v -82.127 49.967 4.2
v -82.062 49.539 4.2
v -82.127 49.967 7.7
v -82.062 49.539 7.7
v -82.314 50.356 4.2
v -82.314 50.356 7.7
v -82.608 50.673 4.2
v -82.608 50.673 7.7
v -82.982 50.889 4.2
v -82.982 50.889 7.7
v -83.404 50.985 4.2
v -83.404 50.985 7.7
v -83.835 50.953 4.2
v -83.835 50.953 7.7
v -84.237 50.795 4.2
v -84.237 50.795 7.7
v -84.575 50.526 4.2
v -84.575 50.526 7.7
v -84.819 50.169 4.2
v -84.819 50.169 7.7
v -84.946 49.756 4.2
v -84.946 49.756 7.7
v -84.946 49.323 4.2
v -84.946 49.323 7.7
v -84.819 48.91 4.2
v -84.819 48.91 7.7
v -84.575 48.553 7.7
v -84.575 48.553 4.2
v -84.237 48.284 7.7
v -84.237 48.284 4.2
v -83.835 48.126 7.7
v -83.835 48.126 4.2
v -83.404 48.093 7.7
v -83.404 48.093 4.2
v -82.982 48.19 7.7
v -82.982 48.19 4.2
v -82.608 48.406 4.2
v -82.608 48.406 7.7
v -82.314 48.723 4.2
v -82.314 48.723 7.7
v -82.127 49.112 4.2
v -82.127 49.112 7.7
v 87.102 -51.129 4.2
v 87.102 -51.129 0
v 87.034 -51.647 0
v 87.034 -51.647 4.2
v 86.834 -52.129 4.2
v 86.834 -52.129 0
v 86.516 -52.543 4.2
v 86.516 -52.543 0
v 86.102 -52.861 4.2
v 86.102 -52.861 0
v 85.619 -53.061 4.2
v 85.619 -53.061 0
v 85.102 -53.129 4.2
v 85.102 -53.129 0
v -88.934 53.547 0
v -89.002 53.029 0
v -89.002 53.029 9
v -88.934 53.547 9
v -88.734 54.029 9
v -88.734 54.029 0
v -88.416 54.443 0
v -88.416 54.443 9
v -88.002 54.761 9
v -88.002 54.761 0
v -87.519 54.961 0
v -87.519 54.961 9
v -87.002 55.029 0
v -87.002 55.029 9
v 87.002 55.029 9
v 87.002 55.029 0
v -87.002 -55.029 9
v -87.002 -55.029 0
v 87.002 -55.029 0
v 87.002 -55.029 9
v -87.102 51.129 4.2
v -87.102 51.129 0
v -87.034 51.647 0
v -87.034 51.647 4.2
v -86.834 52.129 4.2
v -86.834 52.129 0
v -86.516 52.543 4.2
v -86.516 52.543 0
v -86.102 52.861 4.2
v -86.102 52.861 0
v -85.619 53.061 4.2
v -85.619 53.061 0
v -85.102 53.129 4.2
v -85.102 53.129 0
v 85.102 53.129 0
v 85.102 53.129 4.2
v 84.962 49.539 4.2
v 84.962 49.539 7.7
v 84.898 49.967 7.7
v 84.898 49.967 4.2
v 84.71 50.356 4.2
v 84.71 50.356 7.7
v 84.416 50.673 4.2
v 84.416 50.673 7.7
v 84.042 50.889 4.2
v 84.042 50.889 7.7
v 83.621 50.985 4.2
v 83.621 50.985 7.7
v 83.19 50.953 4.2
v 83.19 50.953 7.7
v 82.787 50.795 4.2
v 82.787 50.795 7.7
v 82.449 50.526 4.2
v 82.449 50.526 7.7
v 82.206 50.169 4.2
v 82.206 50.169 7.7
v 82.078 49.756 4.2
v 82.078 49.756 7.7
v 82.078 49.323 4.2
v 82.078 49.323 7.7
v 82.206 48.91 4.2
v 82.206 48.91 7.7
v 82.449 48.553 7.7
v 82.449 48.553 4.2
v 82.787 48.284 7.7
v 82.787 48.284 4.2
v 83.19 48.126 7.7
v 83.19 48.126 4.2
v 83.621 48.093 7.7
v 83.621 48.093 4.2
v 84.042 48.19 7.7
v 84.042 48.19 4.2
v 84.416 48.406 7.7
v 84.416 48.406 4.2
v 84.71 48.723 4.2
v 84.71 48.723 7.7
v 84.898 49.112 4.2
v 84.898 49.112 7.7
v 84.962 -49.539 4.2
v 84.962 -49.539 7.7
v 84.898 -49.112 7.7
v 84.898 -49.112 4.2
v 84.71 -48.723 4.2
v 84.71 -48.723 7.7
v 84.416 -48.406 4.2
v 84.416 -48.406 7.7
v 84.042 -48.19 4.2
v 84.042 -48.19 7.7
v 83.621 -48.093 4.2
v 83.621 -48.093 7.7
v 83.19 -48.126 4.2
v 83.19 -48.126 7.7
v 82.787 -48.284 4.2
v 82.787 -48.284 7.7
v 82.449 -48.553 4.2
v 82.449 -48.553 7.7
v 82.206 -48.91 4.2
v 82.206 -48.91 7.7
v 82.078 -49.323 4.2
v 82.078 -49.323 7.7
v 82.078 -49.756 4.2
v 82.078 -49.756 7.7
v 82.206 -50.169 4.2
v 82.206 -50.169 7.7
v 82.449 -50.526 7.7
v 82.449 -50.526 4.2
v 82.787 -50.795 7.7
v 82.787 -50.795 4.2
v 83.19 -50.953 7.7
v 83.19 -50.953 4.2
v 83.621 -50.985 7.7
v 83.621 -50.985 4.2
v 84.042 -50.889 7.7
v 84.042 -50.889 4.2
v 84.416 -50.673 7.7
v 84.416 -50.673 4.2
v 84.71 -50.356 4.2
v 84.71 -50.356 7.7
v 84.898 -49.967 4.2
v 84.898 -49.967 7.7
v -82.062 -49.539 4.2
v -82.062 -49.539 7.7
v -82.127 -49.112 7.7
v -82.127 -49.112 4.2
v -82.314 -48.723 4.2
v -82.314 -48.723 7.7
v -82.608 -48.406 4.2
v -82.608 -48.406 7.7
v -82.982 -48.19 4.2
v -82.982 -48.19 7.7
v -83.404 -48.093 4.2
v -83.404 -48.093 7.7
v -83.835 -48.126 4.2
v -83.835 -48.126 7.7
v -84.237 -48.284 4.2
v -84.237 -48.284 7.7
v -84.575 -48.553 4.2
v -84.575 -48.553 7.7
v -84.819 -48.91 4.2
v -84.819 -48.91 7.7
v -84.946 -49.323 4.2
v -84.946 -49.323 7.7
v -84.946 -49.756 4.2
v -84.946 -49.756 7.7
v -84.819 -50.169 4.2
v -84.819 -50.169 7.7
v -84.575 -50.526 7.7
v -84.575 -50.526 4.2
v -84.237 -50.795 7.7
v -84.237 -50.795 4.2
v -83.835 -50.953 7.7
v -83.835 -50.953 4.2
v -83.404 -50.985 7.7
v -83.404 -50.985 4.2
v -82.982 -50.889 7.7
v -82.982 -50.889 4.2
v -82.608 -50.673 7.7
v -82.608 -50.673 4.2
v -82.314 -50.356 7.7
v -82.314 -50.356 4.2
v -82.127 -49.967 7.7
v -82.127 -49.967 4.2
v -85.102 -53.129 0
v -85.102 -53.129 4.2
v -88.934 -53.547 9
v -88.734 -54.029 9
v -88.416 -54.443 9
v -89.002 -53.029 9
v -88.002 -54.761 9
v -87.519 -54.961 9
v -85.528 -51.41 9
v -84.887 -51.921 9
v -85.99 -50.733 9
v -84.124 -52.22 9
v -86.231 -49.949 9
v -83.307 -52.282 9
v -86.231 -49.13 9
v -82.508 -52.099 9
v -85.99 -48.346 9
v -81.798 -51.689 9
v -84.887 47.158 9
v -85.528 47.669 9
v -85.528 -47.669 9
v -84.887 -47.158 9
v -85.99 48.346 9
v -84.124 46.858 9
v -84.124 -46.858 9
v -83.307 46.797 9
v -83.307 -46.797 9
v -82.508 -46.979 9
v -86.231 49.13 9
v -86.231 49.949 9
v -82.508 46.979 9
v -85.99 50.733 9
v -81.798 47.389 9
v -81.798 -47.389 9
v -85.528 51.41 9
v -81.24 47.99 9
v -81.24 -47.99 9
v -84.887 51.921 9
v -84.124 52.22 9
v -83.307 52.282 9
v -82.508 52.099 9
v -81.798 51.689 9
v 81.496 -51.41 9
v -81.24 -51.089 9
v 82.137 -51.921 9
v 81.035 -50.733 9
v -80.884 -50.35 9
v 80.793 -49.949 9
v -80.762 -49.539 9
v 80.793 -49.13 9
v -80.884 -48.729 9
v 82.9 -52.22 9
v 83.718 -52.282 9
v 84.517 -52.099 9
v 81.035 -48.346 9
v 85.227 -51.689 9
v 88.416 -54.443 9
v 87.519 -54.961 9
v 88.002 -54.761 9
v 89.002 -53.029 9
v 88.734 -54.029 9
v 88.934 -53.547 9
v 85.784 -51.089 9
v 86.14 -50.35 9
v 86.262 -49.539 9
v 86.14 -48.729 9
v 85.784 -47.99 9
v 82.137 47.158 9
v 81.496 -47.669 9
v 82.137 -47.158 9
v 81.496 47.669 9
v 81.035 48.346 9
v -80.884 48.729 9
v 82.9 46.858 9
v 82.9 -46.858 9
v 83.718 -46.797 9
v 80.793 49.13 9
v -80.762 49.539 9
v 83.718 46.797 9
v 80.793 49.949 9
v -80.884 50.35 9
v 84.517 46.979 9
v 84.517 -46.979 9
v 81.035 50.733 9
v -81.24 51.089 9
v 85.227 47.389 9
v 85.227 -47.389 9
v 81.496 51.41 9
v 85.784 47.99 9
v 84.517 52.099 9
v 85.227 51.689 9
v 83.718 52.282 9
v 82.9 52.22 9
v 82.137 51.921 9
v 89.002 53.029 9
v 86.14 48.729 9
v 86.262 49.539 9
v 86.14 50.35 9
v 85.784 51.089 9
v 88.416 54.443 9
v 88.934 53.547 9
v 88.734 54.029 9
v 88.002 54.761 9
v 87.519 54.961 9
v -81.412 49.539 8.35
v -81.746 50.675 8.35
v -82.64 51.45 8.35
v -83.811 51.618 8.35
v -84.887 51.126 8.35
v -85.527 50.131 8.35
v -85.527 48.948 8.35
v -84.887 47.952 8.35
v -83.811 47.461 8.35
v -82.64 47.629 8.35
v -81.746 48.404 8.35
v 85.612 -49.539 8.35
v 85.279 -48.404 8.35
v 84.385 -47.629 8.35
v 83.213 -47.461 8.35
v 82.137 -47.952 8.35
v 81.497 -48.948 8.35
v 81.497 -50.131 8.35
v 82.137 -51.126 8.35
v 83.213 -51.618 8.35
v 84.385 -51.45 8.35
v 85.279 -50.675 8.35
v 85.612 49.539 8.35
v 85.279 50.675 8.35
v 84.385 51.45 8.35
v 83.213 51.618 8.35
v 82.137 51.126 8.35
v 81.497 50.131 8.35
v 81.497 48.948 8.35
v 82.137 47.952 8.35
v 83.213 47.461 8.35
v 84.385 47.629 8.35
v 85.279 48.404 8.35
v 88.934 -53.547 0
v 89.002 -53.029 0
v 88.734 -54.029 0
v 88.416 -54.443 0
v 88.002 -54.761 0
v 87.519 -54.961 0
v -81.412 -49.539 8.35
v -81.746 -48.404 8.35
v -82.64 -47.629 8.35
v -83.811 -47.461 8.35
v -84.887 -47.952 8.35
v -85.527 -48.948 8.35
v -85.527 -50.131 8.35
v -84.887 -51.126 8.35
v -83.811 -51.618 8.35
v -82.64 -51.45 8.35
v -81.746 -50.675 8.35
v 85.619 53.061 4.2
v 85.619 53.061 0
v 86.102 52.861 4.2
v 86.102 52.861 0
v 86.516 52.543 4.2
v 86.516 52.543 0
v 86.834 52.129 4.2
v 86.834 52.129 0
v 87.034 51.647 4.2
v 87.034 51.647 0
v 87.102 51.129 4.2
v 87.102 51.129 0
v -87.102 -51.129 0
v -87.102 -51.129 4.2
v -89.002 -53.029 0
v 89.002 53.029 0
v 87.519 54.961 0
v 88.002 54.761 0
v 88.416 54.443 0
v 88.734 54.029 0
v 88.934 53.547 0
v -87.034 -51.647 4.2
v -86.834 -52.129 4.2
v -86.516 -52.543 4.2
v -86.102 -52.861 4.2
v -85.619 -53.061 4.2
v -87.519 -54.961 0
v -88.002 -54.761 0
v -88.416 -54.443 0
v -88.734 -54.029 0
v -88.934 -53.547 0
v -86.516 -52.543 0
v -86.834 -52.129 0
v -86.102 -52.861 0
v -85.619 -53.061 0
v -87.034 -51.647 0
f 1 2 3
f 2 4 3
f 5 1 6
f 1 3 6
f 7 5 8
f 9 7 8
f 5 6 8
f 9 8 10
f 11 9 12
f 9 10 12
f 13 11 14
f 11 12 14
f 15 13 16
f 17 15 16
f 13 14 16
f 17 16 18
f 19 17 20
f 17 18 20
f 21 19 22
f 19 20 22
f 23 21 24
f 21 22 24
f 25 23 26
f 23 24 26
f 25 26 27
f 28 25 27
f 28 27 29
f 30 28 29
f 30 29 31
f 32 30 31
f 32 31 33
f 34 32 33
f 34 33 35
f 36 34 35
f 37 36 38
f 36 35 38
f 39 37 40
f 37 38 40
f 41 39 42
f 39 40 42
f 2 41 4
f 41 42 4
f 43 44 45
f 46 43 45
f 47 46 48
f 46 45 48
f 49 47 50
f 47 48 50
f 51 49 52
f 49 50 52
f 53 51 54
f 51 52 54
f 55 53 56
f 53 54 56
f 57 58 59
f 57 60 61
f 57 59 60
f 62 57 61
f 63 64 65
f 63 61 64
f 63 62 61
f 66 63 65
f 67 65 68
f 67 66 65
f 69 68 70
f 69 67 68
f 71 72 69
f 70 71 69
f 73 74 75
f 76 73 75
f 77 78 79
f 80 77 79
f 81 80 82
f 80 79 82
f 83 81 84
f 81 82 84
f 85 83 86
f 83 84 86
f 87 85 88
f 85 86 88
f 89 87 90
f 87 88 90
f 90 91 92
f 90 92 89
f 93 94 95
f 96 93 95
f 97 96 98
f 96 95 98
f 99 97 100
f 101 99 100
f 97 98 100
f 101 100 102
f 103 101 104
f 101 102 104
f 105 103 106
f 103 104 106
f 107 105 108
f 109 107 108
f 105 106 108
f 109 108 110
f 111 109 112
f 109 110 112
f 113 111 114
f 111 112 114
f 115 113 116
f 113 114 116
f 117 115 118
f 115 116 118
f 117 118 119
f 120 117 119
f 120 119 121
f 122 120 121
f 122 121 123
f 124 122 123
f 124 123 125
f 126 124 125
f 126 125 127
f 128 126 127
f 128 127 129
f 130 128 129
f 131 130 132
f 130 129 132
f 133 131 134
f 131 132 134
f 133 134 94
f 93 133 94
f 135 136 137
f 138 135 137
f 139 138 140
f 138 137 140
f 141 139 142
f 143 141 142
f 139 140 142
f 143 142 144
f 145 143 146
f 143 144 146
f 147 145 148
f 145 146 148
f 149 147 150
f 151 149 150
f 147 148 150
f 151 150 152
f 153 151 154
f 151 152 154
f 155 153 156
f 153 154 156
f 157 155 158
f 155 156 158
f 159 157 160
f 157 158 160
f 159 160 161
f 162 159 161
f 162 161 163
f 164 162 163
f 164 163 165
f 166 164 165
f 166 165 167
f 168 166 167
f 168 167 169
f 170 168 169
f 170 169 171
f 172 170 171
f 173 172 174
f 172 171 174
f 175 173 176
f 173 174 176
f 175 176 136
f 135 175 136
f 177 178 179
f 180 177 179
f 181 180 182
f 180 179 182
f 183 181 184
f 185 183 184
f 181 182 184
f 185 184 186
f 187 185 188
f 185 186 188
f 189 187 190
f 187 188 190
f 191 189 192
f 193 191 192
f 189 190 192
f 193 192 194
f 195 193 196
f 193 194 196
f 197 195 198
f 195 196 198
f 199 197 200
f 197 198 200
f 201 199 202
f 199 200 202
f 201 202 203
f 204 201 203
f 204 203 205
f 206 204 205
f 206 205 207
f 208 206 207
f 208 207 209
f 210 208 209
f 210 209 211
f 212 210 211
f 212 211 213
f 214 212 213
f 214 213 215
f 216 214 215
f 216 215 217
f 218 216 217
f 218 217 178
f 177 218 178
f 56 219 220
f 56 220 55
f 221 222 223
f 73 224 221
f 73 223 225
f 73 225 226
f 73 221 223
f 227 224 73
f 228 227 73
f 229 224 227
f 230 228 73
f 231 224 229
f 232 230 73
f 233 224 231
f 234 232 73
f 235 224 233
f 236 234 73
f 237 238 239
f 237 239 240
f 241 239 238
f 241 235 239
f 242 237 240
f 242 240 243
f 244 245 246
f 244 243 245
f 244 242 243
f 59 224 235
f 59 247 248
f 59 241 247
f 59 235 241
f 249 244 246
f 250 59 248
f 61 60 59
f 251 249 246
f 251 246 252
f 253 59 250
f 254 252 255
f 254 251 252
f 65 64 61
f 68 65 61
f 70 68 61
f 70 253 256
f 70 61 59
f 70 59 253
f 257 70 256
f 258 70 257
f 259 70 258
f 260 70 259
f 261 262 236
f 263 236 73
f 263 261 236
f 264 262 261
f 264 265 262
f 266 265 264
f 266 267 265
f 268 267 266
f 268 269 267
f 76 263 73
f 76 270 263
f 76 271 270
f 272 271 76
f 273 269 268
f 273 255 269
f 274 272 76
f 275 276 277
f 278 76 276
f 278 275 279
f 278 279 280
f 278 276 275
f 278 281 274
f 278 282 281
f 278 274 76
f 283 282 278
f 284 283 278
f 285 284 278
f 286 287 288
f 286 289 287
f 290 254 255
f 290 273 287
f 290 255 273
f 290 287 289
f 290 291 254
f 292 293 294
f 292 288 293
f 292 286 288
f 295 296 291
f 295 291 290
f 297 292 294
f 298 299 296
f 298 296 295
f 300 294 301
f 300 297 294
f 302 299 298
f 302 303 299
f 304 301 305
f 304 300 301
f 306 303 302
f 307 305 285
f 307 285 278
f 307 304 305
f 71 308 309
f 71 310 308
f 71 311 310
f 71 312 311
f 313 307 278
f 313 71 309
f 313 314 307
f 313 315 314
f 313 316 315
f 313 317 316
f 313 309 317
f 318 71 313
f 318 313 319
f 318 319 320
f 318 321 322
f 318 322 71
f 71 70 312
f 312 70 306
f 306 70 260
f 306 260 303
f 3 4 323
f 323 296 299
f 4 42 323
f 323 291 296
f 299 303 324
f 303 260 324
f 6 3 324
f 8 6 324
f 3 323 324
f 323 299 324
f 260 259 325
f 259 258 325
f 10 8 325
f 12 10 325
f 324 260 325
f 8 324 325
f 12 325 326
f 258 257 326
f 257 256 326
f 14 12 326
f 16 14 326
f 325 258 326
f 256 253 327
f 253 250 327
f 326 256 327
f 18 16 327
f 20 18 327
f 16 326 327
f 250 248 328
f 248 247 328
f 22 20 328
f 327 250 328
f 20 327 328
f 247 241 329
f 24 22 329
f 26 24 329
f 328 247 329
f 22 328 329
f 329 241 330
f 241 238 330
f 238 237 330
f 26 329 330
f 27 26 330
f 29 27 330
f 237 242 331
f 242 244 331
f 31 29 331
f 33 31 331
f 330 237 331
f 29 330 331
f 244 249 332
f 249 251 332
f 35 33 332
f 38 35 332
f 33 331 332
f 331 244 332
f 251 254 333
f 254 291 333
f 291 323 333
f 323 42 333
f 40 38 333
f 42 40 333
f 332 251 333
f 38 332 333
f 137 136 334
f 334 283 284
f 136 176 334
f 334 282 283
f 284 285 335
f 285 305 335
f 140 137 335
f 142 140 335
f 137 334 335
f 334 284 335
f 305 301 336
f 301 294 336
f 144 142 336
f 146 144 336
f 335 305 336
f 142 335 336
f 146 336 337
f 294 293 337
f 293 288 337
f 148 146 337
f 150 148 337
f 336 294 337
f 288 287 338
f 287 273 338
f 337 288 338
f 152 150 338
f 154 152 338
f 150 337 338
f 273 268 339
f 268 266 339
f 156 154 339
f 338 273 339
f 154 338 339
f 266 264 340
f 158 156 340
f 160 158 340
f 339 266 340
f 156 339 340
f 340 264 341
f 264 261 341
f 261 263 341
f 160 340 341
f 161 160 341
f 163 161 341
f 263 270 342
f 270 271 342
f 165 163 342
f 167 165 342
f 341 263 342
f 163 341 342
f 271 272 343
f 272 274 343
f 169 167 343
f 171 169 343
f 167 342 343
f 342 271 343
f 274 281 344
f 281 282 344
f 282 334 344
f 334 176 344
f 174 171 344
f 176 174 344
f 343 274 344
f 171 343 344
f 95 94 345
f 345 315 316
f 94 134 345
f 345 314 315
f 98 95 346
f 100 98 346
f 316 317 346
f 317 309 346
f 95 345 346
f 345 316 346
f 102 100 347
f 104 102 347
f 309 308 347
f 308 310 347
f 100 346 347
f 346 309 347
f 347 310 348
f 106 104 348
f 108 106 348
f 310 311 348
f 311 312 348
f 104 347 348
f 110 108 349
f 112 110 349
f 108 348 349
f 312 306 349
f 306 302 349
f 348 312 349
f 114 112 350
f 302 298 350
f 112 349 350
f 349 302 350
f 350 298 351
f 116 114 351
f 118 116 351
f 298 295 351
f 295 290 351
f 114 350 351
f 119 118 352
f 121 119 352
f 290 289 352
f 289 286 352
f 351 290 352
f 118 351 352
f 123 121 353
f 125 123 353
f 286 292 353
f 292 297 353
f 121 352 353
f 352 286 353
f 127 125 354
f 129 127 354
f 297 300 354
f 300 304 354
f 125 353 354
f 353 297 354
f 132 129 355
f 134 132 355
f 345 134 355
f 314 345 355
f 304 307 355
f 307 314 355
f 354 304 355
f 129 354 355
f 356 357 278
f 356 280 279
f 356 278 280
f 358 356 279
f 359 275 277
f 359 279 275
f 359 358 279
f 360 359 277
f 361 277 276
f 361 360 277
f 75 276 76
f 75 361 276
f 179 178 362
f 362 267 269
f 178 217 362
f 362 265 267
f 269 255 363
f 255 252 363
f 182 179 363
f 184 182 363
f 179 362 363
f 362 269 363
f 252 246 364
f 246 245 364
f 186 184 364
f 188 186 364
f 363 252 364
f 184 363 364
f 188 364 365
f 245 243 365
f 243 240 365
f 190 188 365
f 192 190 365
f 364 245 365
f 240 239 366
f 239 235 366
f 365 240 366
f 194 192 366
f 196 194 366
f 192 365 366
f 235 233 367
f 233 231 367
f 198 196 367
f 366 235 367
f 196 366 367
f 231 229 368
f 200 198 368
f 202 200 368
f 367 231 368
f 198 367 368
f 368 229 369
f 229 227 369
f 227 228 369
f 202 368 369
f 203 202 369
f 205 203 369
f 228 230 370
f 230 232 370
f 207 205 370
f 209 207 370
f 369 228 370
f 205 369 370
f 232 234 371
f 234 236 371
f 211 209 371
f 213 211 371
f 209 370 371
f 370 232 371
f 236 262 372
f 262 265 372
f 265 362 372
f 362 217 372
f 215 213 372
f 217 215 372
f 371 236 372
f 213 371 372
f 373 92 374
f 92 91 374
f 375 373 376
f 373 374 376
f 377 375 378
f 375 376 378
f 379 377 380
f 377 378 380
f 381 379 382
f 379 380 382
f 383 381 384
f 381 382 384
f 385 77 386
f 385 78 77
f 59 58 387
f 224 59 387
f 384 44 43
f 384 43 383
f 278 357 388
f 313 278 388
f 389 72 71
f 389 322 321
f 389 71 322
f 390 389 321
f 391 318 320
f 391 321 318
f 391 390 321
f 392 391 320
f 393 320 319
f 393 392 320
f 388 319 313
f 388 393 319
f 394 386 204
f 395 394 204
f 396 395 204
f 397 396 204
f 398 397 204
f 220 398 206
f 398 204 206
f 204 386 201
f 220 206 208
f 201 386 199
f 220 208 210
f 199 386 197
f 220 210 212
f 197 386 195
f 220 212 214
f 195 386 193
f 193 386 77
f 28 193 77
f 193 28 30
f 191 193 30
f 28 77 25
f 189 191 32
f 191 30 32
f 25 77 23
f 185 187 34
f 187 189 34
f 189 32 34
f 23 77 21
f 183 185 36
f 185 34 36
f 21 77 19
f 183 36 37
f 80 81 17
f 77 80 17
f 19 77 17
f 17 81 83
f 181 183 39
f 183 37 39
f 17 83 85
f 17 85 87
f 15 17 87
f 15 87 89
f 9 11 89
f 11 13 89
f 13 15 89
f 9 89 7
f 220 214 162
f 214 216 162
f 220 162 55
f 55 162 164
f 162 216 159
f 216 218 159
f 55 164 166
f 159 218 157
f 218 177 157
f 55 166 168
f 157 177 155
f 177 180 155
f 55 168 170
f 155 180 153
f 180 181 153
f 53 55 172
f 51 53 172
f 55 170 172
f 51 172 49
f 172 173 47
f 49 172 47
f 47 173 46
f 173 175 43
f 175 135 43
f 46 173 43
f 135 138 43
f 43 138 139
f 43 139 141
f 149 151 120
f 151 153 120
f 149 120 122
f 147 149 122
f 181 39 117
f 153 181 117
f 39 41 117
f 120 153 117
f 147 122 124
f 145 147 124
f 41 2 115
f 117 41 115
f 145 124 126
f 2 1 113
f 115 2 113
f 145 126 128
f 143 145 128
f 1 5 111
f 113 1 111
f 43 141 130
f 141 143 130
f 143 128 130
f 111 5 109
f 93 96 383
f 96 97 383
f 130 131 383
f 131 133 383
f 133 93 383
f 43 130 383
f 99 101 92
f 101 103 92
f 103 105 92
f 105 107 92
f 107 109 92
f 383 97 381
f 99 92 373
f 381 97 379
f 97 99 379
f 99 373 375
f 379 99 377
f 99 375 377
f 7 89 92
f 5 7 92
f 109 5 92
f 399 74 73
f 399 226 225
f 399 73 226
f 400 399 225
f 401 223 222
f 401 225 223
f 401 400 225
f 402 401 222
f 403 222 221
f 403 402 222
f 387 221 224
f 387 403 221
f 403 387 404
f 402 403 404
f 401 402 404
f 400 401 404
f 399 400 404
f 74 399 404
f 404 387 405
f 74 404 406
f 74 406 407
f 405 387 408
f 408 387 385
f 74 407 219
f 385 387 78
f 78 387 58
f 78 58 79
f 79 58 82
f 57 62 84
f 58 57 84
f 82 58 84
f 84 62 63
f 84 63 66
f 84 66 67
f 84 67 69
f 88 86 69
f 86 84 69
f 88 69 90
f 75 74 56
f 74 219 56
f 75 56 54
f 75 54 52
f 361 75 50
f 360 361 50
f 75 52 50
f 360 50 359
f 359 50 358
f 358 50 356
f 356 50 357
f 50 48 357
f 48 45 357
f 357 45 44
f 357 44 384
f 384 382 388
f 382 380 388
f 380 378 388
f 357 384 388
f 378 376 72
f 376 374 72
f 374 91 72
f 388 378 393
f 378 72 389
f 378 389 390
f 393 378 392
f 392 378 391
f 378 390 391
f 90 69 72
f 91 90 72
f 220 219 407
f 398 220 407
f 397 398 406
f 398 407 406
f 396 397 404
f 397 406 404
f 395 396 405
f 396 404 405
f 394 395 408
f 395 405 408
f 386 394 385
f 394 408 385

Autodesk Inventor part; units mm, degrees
ref_plane "YZ Plane" through (0, 0, 0) normal (1, 0, 0) x (0, 1, 0)
ref_plane "XZ Plane" through (0, 0, 0) normal (0, 1, 0) x (-1, 0, 0)
ref_plane "XY Plane" through (0, 0, 0) normal (0, 0, 1) x (1, 0, 0)
sketch "Sketch3" plane through (0, 0, 0) normal (0, 0, 1) x (1, 0, 0)
  line L0 (-8.9702, 53.029) -> (-8.9702, 53.0291) projected
  line L1 (-8.9702, 53.0291) -> (-4.9702, 53.0291) projected
  line L2 (-4.9702, 53.0291) -> (-4.9702, 55.029) projected
  line L3 (-4.9702, 55.029) -> (-87.0018, 55.029) projected
  arc A0 (-87.0018, 55.029) -> (-89.0018, 53.029) centre (-87.0018, 53.029) ccw projected
  line L4 (-89.0018, 53.029) -> (-89.0018, -53.029) projected
  arc A1 (-89.0018, -53.029) -> (-87.0018, -55.029) centre (-87.0018, -53.029) ccw projected
  line L5 (-87.0018, -55.029) -> (-4.9702, -55.029) projected
  line L6 (-4.9702, -55.029) -> (-4.9702, -53.029) projected
  line L7 (-4.9702, -53.029) -> (-8.9702, -53.029) projected
  line L8 (-8.9702, -53.029) -> (-85.0018, -53.029) projected
  arc A2 (-87.0018, -51.029) -> (-85.0018, -53.029) centre (-85.0018, -51.029) ccw projected
  line L9 (-87.0018, -51.029) -> (-87.0018, 51.029) projected
  arc A3 (-85.0018, 53.029) -> (-87.0018, 51.029) centre (-85.0018, 51.029) ccw projected
  line L10 (-85.0018, 53.029) -> (-8.9702, 53.029) projected
  line L11 (49.0298, 53.0291) -> (49.0298, 53.029) projected
  line L12 (49.0298, 53.029) -> (85.0018, 53.029) projected
  arc A4 (87.0018, 51.029) -> (85.0018, 53.029) centre (85.0018, 51.029) ccw projected
  line L13 (87.0018, 51.029) -> (87.0018, -51.029) projected
  arc A5 (85.0018, -53.029) -> (87.0018, -51.029) centre (85.0018, -51.029) ccw projected
  line L14 (85.0018, -53.029) -> (49.0298, -53.029) projected
  line L15 (49.0298, -53.029) -> (45.0298, -53.029) projected
  line L16 (45.0298, -53.029) -> (45.0298, -55.029) projected
  line L17 (45.0298, -55.029) -> (87.0018, -55.029) projected
  arc A6 (87.0018, -55.029) -> (89.0018, -53.029) centre (87.0018, -53.029) ccw projected
  line L18 (89.0018, -53.029) -> (89.0018, 53.029) projected
  arc A7 (89.0018, 53.029) -> (87.0018, 55.029) centre (87.0018, 53.029) ccw projected
  line L19 (87.0018, 55.029) -> (45.0298, 55.029) projected
  line L20 (45.0298, 55.029) -> (45.0298, 53.0291) projected
  line L21 (45.0298, 53.0291) -> (49.0298, 53.0291) projected
  line L22 (87.0018, 55.029) -> (-87.0018, 55.029)
  line L23 (-89.0018, 53.029) -> (-89.0018, -53.029)
  line L24 (-87.0018, -55.029) -> (87.0018, -55.029)
  line L25 (89.0018, -53.029) -> (89.0018, 53.029)
  line L26 (85.1018, 53.129) -> (-85.1018, 53.129)
  line L27 (-87.1018, 51.129) -> (-87.1018, -51.129)
  line L28 (-85.1018, -53.129) -> (85.1018, -53.129)
  line L29 (87.1018, -51.129) -> (87.1018, 51.129)
  arc A8 (89.0018, 53.029) -> (87.0018, 55.029) centre (87.0018, 53.029) ccw
  arc A9 (87.1018, 51.129) -> (85.1018, 53.129) centre (85.1018, 51.129) ccw
  arc A10 (85.1018, -53.129) -> (87.1018, -51.129) centre (85.1018, -51.129) ccw
  arc A11 (87.0018, -55.029) -> (89.0018, -53.029) centre (87.0018, -53.029) ccw
  arc A12 (-87.1018, -51.129) -> (-85.1018, -53.129) centre (-85.1018, -51.129) ccw
  arc A13 (-89.0018, -53.029) -> (-87.0018, -55.029) centre (-87.0018, -53.029) ccw
  arc A14 (-85.1018, 53.129) -> (-87.1018, 51.129) centre (-85.1018, 51.129) ccw
  arc A15 (-87.0018, 55.029) -> (-89.0018, 53.029) centre (-87.0018, 53.029) ccw
  point P0 (0, 0)
  dimension "d0" = 0.1
  dimension "d1" = 0.1
  dimension "d2" = 0.1
  dimension "d3" = 0.1
  dimension "d4" = 2
extrude "Extrusion1" add sketch "Sketch3" along normal blind 4.2 contours L26 A14 L27 A12 L28 L6 L5 A1 L4 A0 L3 L2 | L2 L22 L20 L26 | L20 L19 A7 L18 A6 L17 L16 L28 A10 L29 A9 L26 | L28 L16 L24 L6
sketch "Sketch4" plane through (0, 0, 4.2) normal (0, 0, 1) x (1, 0, 0)
  line L0 (-87.0018, -55.029) -> (87.0018, -55.029) projected
  arc A0 (87.0018, -55.029) -> (89.0018, -53.029) centre (87.0018, -53.029) ccw projected
  line L1 (89.0018, -53.029) -> (89.0018, 53.029) projected
  arc A1 (89.0018, 53.029) -> (87.0018, 55.029) centre (87.0018, 53.029) ccw projected
  line L2 (87.0018, 55.029) -> (-87.0018, 55.029) projected
  arc A2 (-87.0018, 55.029) -> (-89.0018, 53.029) centre (-87.0018, 53.029) ccw projected
  line L3 (-89.0018, 53.029) -> (-89.0018, -53.029) projected
  arc A3 (-89.0018, -53.029) -> (-87.0018, -55.029) centre (-87.0018, -53.029) ccw projected
  line L4 (85.1018, -53.129) -> (-85.1018, -53.129) projected
  arc A4 (-87.1018, -51.129) -> (-85.1018, -53.129) centre (-85.1018, -51.129) ccw projected
  line L5 (-87.1018, -51.129) -> (-87.1018, 51.129) projected
  arc A5 (-85.1018, 53.129) -> (-87.1018, 51.129) centre (-85.1018, 51.129) ccw projected
  line L6 (-85.1018, 53.129) -> (85.1018, 53.129) projected
  arc A6 (87.1018, 51.129) -> (85.1018, 53.129) centre (85.1018, 51.129) ccw projected
  line L7 (87.1018, 51.129) -> (87.1018, -51.129) projected
  arc A7 (85.1018, -53.129) -> (87.1018, -51.129) centre (85.1018, -51.129) ccw projected
  point P0 (0, 0)
extrude "Extrusion2" add sketch "Sketch4" along normal blind 4.8 contours A3 L3 A2 L2 A1 L1 A0 L0 | L4 A4 L5 A5 L6 A6 L7 A7
sketch "Sketch5" plane through (0, 0, 9) normal (0, 0, 1) x (1, 0, 0)
  circle A0 centre (83.5122, 49.5394) radius 2 projected
  circle A1 centre (83.5122, -49.5394) radius 2 projected
  circle A2 centre (-83.5122, -49.5394) radius 2 projected
  circle A3 centre (-83.5122, 49.5394) radius 2 projected
  circle A4 centre (83.5122, 49.5394) radius 1.45
  circle A5 centre (83.5122, -49.5394) radius 1.45
  circle A6 centre (-83.5122, -49.5394) radius 1.45
  circle A7 centre (-83.5122, 49.5394) radius 1.45
  point P0 (0, 0)
  dimension "d9" = 2.9
  dimension "d10" = 2.9
  dimension "d11" = 2.9
  dimension "d12" = 2.9
extrude "Extrusion3" cut sketch "Sketch5" against normal blind 10 contours A4 | A5 | A6 | A7
chamfer "Chamfer1" distance 1.3 angle 45 4 edges at (82.0622, 49.5394, 9) (82.0622, -49.5394, 9) (-84.9622, 49.5394, 9) (-84.9622, -49.5394, 9)
properties part number "First_Stage_BoxTop_Print"
